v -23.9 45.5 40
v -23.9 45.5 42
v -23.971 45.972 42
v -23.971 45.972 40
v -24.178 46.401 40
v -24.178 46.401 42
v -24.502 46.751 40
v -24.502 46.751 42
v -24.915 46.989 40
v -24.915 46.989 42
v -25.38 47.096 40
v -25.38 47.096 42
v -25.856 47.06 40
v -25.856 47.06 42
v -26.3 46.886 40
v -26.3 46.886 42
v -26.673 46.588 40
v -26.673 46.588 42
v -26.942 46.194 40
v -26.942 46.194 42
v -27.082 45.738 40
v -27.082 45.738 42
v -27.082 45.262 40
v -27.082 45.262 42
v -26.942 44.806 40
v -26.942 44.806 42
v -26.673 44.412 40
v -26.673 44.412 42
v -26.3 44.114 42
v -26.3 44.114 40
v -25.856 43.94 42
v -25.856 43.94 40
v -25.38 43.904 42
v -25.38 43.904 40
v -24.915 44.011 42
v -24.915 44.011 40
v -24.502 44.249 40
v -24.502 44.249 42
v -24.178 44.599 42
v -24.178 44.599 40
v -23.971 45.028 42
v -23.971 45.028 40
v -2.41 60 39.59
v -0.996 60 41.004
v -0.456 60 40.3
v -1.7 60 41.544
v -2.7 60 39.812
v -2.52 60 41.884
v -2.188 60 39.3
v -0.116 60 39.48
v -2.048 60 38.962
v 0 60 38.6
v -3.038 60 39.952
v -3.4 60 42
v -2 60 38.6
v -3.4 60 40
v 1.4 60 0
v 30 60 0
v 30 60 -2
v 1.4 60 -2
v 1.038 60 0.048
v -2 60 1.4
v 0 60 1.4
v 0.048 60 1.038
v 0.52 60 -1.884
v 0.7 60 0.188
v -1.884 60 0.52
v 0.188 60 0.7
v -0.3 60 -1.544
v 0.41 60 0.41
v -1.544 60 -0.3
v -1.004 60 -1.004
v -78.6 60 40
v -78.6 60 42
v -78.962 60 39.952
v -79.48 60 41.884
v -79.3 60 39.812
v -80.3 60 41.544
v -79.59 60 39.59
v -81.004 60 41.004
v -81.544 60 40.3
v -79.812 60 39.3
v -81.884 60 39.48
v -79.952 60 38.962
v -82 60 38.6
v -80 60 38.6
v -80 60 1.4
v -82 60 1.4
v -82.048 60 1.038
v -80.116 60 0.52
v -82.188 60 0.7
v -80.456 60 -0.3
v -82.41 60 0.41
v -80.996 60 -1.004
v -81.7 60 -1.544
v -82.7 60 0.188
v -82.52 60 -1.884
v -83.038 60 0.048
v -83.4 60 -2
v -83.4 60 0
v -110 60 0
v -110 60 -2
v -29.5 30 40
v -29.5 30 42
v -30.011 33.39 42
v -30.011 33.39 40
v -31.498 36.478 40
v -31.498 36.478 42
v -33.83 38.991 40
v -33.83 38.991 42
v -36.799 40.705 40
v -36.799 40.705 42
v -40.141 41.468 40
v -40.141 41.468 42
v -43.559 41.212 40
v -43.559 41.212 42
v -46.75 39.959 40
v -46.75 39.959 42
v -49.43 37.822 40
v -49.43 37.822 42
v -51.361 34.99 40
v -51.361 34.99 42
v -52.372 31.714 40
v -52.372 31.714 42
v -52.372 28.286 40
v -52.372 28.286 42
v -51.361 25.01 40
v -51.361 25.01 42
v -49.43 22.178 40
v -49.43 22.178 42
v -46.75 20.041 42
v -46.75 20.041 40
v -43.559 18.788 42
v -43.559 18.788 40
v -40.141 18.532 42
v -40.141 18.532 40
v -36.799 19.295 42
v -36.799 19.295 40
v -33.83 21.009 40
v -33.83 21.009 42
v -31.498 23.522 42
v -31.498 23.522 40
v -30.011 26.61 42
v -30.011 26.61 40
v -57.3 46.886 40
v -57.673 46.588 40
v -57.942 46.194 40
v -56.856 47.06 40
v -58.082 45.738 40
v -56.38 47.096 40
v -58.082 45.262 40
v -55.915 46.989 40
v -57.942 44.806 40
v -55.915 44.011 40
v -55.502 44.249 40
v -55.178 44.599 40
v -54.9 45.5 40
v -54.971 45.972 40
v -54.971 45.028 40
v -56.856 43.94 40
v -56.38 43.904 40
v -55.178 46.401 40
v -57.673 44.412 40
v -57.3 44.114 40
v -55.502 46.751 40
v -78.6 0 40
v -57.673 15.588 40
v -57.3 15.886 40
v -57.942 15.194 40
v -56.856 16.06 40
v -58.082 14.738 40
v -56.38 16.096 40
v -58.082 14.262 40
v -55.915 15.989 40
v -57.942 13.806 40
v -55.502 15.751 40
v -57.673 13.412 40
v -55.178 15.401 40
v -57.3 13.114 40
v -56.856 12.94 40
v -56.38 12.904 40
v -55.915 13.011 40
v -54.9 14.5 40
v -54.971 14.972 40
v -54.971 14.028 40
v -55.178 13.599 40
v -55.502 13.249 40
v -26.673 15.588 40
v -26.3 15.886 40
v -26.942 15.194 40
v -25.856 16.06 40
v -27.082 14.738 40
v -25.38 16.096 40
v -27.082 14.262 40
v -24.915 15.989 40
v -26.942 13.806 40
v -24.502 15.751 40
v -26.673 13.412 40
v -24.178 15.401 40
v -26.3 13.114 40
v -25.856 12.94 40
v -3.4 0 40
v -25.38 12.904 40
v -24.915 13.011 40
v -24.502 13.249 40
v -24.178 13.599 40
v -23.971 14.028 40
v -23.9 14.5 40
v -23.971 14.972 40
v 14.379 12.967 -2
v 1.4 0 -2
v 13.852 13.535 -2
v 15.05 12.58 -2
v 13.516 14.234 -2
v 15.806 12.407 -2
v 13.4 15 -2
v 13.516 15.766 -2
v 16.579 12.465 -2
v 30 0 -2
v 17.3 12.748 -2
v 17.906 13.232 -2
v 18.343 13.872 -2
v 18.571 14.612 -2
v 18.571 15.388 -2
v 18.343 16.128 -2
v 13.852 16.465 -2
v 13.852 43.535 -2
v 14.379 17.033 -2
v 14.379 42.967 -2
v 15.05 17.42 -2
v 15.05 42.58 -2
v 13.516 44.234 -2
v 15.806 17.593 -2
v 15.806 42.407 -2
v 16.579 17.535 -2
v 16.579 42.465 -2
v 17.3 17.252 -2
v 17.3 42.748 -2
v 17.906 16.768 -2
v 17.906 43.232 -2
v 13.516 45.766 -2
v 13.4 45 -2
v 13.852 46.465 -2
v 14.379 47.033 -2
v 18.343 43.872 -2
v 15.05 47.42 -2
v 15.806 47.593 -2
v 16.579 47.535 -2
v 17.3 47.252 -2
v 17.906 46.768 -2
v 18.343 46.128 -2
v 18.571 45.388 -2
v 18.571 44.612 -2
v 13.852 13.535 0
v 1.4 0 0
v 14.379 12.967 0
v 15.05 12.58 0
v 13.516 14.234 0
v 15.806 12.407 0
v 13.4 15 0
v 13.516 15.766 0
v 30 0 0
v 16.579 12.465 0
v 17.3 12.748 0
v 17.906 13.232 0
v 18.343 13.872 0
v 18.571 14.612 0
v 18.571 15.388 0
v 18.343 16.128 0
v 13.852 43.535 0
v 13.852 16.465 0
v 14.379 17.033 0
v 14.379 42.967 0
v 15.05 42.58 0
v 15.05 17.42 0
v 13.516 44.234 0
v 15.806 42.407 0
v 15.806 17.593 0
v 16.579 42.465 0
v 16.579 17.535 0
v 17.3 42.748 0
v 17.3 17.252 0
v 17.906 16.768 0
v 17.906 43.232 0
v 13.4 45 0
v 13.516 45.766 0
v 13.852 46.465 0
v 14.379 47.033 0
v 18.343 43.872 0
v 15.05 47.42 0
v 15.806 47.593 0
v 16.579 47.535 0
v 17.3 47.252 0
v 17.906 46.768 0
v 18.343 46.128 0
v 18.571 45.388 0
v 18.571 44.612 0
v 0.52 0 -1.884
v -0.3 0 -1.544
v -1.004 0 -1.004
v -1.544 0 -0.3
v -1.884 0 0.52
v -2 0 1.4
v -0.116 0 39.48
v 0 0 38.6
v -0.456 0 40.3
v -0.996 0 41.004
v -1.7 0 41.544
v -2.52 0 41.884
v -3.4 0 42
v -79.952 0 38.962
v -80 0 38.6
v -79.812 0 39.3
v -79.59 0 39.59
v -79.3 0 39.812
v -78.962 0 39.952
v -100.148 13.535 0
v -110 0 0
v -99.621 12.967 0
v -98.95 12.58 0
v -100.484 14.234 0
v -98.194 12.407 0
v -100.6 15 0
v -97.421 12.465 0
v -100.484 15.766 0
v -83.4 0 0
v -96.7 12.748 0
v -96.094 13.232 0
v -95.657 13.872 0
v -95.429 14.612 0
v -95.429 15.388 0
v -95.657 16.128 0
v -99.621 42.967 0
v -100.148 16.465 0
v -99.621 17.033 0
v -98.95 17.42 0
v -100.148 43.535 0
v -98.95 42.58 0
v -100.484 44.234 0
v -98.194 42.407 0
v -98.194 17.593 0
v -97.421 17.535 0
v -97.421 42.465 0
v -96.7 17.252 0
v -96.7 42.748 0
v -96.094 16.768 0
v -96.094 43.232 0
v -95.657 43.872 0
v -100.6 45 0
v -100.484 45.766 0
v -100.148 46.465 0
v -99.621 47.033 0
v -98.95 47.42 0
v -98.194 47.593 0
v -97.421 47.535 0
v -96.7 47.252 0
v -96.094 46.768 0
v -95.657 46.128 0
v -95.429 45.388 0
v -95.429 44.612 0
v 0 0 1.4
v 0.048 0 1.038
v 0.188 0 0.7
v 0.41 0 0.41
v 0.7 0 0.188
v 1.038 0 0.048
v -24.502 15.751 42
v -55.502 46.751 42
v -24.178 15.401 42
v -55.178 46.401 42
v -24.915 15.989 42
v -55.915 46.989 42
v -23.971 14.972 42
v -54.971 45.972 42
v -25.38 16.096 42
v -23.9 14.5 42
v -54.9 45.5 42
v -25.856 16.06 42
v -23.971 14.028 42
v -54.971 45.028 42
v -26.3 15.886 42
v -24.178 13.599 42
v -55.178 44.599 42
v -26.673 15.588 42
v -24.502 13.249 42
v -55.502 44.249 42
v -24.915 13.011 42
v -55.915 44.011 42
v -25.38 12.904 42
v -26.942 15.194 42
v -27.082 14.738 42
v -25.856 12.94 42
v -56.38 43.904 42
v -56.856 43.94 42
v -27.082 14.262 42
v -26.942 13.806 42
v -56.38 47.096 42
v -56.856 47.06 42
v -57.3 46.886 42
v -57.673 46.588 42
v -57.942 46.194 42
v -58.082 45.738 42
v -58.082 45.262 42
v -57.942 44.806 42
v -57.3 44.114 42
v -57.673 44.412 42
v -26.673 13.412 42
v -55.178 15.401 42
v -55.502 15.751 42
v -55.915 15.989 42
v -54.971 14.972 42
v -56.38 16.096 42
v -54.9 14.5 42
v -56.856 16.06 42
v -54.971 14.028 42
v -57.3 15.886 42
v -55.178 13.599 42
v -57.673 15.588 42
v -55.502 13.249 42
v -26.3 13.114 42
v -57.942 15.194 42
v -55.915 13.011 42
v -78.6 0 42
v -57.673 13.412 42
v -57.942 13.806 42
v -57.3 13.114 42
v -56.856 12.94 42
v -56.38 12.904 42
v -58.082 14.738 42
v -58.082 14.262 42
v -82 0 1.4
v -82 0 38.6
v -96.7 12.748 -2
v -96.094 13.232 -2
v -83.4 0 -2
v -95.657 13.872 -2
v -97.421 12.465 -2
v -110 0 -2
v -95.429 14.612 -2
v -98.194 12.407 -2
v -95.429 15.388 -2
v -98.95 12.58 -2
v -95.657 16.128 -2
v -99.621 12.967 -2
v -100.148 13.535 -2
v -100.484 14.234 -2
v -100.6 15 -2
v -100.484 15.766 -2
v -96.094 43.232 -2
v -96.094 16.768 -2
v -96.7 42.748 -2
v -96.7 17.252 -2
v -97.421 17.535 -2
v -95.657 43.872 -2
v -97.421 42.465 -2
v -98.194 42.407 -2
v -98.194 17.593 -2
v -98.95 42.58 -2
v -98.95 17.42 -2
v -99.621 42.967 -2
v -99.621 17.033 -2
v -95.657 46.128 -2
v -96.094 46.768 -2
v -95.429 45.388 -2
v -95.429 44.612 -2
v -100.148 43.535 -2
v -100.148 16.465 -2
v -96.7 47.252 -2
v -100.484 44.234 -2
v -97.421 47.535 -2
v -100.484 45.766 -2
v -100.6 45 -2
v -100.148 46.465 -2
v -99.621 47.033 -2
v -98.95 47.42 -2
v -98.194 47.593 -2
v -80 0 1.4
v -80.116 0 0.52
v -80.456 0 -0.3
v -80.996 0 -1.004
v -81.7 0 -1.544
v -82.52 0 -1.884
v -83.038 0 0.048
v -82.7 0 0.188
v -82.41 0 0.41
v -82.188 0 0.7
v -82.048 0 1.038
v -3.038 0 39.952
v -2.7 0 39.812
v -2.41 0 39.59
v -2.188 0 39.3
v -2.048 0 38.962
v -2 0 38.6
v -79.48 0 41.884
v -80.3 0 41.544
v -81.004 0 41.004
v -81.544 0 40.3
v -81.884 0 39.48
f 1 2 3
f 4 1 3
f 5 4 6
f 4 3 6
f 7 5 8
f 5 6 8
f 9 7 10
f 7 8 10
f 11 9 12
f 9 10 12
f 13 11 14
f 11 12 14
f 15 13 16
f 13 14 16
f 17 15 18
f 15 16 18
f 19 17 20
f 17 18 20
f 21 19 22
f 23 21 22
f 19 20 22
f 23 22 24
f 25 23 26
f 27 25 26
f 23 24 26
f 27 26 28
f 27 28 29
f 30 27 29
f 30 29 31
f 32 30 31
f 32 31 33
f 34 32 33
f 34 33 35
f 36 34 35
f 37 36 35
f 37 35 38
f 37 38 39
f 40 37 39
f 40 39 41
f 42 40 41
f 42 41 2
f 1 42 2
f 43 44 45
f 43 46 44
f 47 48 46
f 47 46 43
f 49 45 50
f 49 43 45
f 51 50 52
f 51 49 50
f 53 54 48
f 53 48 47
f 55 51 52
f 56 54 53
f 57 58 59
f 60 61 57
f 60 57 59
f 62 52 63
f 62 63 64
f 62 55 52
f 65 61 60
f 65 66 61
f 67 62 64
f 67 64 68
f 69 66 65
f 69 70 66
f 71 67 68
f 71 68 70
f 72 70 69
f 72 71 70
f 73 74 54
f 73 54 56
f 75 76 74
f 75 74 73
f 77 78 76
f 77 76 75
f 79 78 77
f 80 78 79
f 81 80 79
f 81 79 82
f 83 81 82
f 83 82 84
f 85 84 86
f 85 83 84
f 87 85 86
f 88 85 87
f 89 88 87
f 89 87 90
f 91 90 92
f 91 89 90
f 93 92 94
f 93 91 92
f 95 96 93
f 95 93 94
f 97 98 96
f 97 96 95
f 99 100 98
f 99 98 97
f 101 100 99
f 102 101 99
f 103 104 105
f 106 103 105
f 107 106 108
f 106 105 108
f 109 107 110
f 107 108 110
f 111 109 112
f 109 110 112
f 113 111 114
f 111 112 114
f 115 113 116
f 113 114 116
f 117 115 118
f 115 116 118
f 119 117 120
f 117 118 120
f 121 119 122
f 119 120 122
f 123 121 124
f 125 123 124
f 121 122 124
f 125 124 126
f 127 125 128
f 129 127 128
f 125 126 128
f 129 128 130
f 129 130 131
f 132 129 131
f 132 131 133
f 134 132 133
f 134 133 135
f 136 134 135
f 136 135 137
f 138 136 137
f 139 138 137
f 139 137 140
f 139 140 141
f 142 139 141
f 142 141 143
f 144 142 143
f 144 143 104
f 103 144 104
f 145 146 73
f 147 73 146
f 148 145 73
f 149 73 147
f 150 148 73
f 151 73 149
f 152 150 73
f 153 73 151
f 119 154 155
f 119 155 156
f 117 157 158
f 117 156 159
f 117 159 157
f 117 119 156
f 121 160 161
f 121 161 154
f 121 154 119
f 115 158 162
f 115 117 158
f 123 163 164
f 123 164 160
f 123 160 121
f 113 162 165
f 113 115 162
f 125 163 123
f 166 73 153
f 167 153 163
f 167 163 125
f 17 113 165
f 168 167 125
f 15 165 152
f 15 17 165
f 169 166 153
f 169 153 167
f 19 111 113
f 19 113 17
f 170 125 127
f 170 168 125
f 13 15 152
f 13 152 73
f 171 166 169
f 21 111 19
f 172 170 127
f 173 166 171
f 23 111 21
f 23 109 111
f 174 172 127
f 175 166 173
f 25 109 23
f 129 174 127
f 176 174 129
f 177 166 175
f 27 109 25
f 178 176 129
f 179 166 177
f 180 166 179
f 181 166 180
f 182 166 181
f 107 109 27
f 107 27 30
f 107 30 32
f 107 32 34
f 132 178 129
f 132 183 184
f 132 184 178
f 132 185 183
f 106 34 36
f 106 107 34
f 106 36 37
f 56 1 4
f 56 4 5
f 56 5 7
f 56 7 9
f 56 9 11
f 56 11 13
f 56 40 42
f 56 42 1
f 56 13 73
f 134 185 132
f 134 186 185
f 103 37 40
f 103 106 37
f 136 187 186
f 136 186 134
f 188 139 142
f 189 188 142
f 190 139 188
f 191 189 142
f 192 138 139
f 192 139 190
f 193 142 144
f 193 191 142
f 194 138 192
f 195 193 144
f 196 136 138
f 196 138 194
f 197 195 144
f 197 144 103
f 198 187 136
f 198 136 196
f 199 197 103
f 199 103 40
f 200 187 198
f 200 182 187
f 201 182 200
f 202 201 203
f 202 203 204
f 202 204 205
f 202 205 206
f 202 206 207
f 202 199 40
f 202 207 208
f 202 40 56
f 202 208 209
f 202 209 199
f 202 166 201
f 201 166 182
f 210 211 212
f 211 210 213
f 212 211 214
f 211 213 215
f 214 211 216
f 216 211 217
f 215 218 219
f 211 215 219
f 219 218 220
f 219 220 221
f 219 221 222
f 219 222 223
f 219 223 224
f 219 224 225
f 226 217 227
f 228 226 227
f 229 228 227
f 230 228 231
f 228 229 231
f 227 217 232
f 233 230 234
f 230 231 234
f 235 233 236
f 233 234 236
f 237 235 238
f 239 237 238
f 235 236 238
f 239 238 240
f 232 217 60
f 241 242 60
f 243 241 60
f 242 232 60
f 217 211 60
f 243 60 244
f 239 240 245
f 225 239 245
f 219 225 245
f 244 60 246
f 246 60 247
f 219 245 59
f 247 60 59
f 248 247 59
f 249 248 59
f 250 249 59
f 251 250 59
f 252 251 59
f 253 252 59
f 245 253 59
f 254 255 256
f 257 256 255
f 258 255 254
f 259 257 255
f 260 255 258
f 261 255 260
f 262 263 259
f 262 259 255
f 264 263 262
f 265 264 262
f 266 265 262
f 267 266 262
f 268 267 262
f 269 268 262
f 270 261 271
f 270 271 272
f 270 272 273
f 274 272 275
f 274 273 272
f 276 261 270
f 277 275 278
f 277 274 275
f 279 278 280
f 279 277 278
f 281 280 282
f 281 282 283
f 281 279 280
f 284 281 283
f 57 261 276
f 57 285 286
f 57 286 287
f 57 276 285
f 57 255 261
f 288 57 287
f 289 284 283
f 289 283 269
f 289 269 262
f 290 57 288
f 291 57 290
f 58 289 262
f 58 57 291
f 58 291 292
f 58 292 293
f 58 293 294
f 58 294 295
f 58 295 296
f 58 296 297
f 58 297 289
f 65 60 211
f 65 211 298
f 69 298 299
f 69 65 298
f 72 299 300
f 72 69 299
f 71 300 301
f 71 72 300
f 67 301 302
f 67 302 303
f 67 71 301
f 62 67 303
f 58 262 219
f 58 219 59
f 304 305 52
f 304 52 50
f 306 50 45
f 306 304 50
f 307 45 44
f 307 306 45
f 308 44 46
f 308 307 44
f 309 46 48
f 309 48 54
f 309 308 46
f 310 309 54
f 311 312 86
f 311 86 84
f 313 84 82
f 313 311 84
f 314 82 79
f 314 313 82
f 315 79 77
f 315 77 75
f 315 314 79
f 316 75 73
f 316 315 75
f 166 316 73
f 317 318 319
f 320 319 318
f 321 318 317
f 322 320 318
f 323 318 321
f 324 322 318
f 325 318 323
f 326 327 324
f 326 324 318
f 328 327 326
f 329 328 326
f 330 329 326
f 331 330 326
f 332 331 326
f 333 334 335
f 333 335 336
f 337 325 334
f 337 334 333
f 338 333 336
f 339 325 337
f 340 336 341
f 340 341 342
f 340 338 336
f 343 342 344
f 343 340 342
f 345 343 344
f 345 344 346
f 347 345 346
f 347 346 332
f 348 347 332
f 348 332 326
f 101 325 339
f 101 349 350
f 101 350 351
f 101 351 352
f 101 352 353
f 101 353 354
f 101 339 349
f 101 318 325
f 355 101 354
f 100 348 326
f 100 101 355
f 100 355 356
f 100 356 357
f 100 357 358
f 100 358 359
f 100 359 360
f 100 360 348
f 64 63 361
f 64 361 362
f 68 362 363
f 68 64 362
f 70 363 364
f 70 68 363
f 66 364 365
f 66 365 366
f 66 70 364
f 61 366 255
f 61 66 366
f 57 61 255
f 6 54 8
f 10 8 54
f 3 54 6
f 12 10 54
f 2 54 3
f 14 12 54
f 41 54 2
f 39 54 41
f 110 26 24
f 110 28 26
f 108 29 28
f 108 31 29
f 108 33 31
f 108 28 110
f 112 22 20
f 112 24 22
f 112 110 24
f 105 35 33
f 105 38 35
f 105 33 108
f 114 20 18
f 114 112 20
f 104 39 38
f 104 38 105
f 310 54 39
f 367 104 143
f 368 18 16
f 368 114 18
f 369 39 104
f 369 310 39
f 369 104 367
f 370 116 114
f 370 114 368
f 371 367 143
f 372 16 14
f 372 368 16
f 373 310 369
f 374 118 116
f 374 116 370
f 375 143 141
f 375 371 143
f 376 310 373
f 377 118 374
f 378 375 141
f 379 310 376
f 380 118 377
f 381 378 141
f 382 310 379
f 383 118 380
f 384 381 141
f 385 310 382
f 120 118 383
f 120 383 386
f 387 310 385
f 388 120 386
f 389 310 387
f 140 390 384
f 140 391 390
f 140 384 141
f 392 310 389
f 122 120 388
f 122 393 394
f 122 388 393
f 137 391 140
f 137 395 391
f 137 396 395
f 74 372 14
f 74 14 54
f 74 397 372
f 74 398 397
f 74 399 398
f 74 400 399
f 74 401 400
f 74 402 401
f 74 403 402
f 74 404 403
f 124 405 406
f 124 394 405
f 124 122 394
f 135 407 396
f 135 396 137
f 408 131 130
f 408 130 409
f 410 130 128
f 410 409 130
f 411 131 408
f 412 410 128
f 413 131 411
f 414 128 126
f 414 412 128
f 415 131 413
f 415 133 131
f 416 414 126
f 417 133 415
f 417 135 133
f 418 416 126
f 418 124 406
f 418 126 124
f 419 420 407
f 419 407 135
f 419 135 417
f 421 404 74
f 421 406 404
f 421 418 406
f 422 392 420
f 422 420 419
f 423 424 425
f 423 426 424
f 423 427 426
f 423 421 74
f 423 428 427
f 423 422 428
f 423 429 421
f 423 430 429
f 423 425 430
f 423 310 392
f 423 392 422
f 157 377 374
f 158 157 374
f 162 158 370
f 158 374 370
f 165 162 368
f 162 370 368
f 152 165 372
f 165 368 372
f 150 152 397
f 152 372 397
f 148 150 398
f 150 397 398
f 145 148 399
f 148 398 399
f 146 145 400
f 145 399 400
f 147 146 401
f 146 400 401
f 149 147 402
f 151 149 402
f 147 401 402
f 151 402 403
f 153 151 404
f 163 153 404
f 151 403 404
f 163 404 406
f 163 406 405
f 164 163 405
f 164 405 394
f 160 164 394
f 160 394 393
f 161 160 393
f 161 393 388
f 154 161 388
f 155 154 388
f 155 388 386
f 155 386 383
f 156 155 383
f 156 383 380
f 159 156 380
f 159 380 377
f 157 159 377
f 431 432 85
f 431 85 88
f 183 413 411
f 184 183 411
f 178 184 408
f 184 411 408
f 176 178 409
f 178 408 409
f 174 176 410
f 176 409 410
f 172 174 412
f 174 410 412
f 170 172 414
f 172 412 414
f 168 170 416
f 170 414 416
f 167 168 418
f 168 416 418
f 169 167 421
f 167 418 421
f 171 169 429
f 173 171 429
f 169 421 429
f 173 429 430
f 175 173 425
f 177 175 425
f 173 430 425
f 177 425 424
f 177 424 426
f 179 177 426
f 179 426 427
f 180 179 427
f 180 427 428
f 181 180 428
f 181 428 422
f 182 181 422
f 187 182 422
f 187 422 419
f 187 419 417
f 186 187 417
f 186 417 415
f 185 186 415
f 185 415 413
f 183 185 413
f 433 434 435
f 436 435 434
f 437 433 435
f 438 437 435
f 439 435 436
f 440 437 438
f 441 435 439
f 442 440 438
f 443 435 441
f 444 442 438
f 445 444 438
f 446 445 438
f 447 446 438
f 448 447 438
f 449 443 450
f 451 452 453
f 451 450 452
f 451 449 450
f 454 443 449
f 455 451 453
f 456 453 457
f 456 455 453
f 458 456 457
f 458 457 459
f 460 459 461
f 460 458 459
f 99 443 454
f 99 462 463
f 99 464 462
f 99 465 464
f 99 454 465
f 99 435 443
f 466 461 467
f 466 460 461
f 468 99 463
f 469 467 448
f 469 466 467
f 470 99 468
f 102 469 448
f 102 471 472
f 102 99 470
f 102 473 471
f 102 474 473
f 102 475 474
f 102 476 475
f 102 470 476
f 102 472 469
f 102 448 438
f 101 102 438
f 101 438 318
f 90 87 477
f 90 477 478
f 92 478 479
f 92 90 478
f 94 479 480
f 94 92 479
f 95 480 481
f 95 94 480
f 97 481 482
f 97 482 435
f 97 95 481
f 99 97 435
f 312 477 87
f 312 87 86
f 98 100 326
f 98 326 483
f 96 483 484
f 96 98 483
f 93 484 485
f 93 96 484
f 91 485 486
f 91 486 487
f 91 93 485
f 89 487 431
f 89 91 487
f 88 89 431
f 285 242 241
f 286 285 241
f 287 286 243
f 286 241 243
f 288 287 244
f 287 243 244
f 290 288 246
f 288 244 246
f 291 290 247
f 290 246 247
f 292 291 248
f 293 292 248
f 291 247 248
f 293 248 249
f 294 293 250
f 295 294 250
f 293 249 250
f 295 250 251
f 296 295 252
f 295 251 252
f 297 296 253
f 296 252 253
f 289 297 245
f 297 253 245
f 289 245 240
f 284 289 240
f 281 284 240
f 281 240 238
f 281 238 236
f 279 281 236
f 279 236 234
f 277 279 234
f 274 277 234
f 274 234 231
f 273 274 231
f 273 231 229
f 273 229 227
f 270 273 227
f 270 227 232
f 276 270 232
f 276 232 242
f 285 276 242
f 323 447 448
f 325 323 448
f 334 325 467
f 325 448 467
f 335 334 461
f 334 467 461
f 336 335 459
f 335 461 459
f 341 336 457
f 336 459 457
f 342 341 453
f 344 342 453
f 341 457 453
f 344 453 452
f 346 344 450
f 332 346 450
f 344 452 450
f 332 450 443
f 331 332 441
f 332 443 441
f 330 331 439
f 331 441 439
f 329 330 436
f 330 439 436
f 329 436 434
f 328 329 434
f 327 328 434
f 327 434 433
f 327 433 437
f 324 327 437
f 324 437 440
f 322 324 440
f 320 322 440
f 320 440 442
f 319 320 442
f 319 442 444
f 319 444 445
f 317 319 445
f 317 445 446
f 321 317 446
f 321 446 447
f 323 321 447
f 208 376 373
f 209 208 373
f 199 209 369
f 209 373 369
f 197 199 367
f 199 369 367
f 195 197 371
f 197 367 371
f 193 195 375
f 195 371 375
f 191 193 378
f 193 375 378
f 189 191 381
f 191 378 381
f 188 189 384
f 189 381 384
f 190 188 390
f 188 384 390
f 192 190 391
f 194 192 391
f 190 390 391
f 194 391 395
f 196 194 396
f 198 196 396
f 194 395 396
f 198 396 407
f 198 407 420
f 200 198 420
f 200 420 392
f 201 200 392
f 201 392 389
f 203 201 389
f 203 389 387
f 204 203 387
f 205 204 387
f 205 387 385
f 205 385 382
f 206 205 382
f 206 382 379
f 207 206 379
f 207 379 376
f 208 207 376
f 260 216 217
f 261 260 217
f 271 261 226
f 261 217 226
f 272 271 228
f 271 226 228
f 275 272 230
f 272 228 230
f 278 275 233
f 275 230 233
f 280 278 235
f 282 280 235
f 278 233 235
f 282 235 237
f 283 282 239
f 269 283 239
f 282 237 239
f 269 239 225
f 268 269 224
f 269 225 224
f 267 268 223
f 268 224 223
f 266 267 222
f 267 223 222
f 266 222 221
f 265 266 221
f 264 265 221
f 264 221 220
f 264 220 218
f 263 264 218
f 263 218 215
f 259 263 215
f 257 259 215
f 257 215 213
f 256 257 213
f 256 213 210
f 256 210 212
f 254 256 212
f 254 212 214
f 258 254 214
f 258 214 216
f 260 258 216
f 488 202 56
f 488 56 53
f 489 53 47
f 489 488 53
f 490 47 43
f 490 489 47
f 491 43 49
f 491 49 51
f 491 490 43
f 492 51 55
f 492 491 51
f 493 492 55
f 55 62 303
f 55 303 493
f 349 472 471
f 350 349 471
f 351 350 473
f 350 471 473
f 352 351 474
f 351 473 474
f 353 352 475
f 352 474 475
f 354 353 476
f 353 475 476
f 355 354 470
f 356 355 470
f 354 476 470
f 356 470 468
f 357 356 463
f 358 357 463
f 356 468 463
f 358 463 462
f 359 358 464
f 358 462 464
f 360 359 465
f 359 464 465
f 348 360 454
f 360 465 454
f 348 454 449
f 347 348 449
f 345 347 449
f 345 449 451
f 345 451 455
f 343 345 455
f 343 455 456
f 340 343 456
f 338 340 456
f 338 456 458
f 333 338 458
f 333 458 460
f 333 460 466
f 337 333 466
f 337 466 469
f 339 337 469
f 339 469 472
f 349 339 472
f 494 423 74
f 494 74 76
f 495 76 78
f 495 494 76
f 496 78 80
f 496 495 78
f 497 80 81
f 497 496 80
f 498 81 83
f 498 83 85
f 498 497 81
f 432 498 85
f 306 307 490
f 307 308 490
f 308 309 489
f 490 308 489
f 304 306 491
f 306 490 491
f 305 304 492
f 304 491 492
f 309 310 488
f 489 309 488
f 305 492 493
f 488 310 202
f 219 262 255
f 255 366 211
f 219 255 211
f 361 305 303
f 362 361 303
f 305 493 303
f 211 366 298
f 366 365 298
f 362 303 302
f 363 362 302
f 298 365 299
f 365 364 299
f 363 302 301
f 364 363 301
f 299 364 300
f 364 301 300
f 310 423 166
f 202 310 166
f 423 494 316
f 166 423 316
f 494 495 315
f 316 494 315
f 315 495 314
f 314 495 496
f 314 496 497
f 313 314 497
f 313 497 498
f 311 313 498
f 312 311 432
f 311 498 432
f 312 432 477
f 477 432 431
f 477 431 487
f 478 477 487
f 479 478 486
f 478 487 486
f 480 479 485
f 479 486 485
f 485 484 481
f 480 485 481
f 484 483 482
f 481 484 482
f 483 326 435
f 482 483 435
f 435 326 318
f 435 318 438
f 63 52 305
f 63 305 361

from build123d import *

# Parameters (mm, degrees)
SKETCH1_W                    = 30
SKETCH1_H                    = 60
BASE_FLANGE1_DEPTH           = 2
EDGE_FLANGE1_STRIP_W         = 12.8
EDGE_FLANGE1_STRIP_H         = 2
EDGE_FLANGE1_STRIP_CUT_DEPTH = 60
EDGE_FLANGE1_DEPTH           = 60
EDGE_FLANGE2_STRIP_W         = 12.8
EDGE_FLANGE2_STRIP_H         = 2
EDGE_FLANGE2_STRIP_CUT_DEPTH = 60
EDGE_FLANGE2_DEPTH           = 60
EDGE_FLANGE3_STRIP_W         = 12.8
EDGE_FLANGE3_STRIP_H         = 2
EDGE_FLANGE3_STRIP_CUT_DEPTH = 60
EDGE_FLANGE3_DEPTH           = 60
EDGE_FLANGE4_STRIP_W         = 12.8
EDGE_FLANGE4_STRIP_H         = 2
EDGE_FLANGE4_STRIP_CUT_DEPTH = 60
EDGE_FLANGE4_DEPTH           = 60
SKETCH22_R                   = 2.6
CUT_EXTRUDE1_DEPTH           = 133.800602408
SKETCH23_R                   = 11.5
SKETCH23_R_2                 = 1.6
CUT_EXTRUDE2_DEPTH           = 5


# Sheet-metal steps are written as plain solids
with BuildPart() as part:
    # Sketch1 → Base-Flange1 (new body)
    with BuildSketch(Plane.XY):
        with Locations((15, 30)):
            Rectangle(SKETCH1_W, SKETCH1_H)
    extrude(amount=-BASE_FLANGE1_DEPTH)

    # Edge-Flange1 strip (across the edge) → Edge-Flange1 strip cut (cut)
    with BuildSketch(Plane(origin=(-2, 60, 0), x_dir=(1, 0, 0), z_dir=(0, -1, 0))):
        with Locations((-3, -1)):
            Rectangle(EDGE_FLANGE1_STRIP_W, EDGE_FLANGE1_STRIP_H)
    extrude(amount=EDGE_FLANGE1_STRIP_CUT_DEPTH, mode=Mode.SUBTRACT)

    # Edge-Flange1 section (across the edge) → Edge-Flange1 (add)
    with BuildSketch(Plane(origin=(-2, 60, 0), x_dir=(1, 0, 0), z_dir=(0, -1, 0))):
        with BuildLine():
            Line((0, 1.4), (0, 40))
            Line((0, 40), (2, 40))
            Line((2, 40), (2, 1.4))
            ThreePointArc((2, 1.4), (2.410050506, 0.410050506), (3.4, 0))
            Line((3.4, 0), (3.4, -2))
            ThreePointArc((3.4, -2), (0.995836944, -1.004163056), (0, 1.4))
        make_face()
    extrude(amount=EDGE_FLANGE1_DEPTH)

    # Edge-Flange2 strip (across the edge) → Edge-Flange2 strip cut (cut)
    with BuildSketch(Plane(origin=(-2, 0, 42), x_dir=(0, 0, -1), z_dir=(0, 1, 0))):
        with Locations((-3, -1)):
            Rectangle(EDGE_FLANGE2_STRIP_W, EDGE_FLANGE2_STRIP_H)
    extrude(amount=EDGE_FLANGE2_STRIP_CUT_DEPTH, mode=Mode.SUBTRACT)

    # Edge-Flange2 section (across the edge) → Edge-Flange2 (add)
    with BuildSketch(Plane(origin=(-2, 0, 42), x_dir=(0, 0, -1), z_dir=(0, 1, 0))):
        with BuildLine():
            Line((0, 1.4), (0, 78))
            Line((0, 78), (2, 78))
            Line((2, 78), (2, 1.4))
            ThreePointArc((2, 1.4), (2.410050506, 0.410050506), (3.4, 0))
            Line((3.4, 0), (3.4, -2))
            ThreePointArc((3.4, -2), (0.995836944, -1.004163056), (0, 1.4))
        make_face()
    extrude(amount=EDGE_FLANGE2_DEPTH)

    # Edge-Flange3 strip (across the edge) → Edge-Flange3 strip cut (cut)
    with BuildSketch(Plane(origin=(-82, 0, 40), x_dir=(1, 0, 0), z_dir=(0, 1, 0))):
        with Locations((-3, -1)):
            Rectangle(EDGE_FLANGE3_STRIP_W, EDGE_FLANGE3_STRIP_H)
    extrude(amount=EDGE_FLANGE3_STRIP_CUT_DEPTH, mode=Mode.SUBTRACT)

    # Edge-Flange3 section (across the edge) → Edge-Flange3 (add)
    with BuildSketch(Plane(origin=(-82, 0, 40), x_dir=(1, 0, 0), z_dir=(0, 1, 0))):
        with BuildLine():
            Line((0, 1.4), (0, 40))
            Line((0, 40), (2, 40))
            Line((2, 40), (2, 1.4))
            ThreePointArc((2, 1.4), (2.410050506, 0.410050506), (3.4, 0))
            Line((3.4, 0), (3.4, -2))
            ThreePointArc((3.4, -2), (0.995836944, -1.004163056), (0, 1.4))
        make_face()
    extrude(amount=EDGE_FLANGE3_DEPTH)

    # Edge-Flange4 strip (across the edge) → Edge-Flange4 strip cut (cut)
    with BuildSketch(Plane(origin=(-82, 60, -2), x_dir=(0, 0, 1), z_dir=(0, -1, 0))):
        with Locations((-3, -1)):
            Rectangle(EDGE_FLANGE4_STRIP_W, EDGE_FLANGE4_STRIP_H)
    extrude(amount=EDGE_FLANGE4_STRIP_CUT_DEPTH, mode=Mode.SUBTRACT)

    # Edge-Flange4 section (across the edge) → Edge-Flange4 (add)
    with BuildSketch(Plane(origin=(-82, 60, -2), x_dir=(0, 0, 1), z_dir=(0, -1, 0))):
        with BuildLine():
            Line((0, 1.4), (0, 28))
            Line((0, 28), (2, 28))
            Line((2, 28), (2, 1.4))
            ThreePointArc((2, 1.4), (2.410050506, 0.410050506), (3.4, 0))
            Line((3.4, 0), (3.4, -2))
            ThreePointArc((3.4, -2), (0.995836944, -1.004163056), (0, 1.4))
        make_face()
    extrude(amount=EDGE_FLANGE4_DEPTH)

    # Sketch22 → Cut-Extrude1 (cut, through all)
    with BuildSketch(Plane(origin=(0, 0, -2), x_dir=(-1, 0, 0), z_dir=(0, 0, -1))):
        with Locations((-16, 45)):
            Circle(SKETCH22_R)
        with Locations((-16, 15)):
            Circle(SKETCH22_R)
        with Locations((98, 45)):
            Circle(SKETCH22_R)
        with Locations((98, 15)):
            Circle(SKETCH22_R)
    extrude(amount=-CUT_EXTRUDE1_DEPTH, mode=Mode.SUBTRACT)

    # Sketch23 → Cut-Extrude2 (cut)
    with BuildSketch(Plane.XY.offset(42)):
        with Locations((-41, 30)):
            Circle(SKETCH23_R)
        with Locations((-25.5, 45.5)):
            Circle(SKETCH23_R_2)
        with Locations((-25.5, 14.5)):
            Circle(SKETCH23_R_2)
        with Locations((-56.5, 14.5)):
            Circle(SKETCH23_R_2)
        with Locations((-56.5, 45.5)):
            Circle(SKETCH23_R_2)
    extrude(amount=-CUT_EXTRUDE2_DEPTH, mode=Mode.SUBTRACT)


solid = part.part
